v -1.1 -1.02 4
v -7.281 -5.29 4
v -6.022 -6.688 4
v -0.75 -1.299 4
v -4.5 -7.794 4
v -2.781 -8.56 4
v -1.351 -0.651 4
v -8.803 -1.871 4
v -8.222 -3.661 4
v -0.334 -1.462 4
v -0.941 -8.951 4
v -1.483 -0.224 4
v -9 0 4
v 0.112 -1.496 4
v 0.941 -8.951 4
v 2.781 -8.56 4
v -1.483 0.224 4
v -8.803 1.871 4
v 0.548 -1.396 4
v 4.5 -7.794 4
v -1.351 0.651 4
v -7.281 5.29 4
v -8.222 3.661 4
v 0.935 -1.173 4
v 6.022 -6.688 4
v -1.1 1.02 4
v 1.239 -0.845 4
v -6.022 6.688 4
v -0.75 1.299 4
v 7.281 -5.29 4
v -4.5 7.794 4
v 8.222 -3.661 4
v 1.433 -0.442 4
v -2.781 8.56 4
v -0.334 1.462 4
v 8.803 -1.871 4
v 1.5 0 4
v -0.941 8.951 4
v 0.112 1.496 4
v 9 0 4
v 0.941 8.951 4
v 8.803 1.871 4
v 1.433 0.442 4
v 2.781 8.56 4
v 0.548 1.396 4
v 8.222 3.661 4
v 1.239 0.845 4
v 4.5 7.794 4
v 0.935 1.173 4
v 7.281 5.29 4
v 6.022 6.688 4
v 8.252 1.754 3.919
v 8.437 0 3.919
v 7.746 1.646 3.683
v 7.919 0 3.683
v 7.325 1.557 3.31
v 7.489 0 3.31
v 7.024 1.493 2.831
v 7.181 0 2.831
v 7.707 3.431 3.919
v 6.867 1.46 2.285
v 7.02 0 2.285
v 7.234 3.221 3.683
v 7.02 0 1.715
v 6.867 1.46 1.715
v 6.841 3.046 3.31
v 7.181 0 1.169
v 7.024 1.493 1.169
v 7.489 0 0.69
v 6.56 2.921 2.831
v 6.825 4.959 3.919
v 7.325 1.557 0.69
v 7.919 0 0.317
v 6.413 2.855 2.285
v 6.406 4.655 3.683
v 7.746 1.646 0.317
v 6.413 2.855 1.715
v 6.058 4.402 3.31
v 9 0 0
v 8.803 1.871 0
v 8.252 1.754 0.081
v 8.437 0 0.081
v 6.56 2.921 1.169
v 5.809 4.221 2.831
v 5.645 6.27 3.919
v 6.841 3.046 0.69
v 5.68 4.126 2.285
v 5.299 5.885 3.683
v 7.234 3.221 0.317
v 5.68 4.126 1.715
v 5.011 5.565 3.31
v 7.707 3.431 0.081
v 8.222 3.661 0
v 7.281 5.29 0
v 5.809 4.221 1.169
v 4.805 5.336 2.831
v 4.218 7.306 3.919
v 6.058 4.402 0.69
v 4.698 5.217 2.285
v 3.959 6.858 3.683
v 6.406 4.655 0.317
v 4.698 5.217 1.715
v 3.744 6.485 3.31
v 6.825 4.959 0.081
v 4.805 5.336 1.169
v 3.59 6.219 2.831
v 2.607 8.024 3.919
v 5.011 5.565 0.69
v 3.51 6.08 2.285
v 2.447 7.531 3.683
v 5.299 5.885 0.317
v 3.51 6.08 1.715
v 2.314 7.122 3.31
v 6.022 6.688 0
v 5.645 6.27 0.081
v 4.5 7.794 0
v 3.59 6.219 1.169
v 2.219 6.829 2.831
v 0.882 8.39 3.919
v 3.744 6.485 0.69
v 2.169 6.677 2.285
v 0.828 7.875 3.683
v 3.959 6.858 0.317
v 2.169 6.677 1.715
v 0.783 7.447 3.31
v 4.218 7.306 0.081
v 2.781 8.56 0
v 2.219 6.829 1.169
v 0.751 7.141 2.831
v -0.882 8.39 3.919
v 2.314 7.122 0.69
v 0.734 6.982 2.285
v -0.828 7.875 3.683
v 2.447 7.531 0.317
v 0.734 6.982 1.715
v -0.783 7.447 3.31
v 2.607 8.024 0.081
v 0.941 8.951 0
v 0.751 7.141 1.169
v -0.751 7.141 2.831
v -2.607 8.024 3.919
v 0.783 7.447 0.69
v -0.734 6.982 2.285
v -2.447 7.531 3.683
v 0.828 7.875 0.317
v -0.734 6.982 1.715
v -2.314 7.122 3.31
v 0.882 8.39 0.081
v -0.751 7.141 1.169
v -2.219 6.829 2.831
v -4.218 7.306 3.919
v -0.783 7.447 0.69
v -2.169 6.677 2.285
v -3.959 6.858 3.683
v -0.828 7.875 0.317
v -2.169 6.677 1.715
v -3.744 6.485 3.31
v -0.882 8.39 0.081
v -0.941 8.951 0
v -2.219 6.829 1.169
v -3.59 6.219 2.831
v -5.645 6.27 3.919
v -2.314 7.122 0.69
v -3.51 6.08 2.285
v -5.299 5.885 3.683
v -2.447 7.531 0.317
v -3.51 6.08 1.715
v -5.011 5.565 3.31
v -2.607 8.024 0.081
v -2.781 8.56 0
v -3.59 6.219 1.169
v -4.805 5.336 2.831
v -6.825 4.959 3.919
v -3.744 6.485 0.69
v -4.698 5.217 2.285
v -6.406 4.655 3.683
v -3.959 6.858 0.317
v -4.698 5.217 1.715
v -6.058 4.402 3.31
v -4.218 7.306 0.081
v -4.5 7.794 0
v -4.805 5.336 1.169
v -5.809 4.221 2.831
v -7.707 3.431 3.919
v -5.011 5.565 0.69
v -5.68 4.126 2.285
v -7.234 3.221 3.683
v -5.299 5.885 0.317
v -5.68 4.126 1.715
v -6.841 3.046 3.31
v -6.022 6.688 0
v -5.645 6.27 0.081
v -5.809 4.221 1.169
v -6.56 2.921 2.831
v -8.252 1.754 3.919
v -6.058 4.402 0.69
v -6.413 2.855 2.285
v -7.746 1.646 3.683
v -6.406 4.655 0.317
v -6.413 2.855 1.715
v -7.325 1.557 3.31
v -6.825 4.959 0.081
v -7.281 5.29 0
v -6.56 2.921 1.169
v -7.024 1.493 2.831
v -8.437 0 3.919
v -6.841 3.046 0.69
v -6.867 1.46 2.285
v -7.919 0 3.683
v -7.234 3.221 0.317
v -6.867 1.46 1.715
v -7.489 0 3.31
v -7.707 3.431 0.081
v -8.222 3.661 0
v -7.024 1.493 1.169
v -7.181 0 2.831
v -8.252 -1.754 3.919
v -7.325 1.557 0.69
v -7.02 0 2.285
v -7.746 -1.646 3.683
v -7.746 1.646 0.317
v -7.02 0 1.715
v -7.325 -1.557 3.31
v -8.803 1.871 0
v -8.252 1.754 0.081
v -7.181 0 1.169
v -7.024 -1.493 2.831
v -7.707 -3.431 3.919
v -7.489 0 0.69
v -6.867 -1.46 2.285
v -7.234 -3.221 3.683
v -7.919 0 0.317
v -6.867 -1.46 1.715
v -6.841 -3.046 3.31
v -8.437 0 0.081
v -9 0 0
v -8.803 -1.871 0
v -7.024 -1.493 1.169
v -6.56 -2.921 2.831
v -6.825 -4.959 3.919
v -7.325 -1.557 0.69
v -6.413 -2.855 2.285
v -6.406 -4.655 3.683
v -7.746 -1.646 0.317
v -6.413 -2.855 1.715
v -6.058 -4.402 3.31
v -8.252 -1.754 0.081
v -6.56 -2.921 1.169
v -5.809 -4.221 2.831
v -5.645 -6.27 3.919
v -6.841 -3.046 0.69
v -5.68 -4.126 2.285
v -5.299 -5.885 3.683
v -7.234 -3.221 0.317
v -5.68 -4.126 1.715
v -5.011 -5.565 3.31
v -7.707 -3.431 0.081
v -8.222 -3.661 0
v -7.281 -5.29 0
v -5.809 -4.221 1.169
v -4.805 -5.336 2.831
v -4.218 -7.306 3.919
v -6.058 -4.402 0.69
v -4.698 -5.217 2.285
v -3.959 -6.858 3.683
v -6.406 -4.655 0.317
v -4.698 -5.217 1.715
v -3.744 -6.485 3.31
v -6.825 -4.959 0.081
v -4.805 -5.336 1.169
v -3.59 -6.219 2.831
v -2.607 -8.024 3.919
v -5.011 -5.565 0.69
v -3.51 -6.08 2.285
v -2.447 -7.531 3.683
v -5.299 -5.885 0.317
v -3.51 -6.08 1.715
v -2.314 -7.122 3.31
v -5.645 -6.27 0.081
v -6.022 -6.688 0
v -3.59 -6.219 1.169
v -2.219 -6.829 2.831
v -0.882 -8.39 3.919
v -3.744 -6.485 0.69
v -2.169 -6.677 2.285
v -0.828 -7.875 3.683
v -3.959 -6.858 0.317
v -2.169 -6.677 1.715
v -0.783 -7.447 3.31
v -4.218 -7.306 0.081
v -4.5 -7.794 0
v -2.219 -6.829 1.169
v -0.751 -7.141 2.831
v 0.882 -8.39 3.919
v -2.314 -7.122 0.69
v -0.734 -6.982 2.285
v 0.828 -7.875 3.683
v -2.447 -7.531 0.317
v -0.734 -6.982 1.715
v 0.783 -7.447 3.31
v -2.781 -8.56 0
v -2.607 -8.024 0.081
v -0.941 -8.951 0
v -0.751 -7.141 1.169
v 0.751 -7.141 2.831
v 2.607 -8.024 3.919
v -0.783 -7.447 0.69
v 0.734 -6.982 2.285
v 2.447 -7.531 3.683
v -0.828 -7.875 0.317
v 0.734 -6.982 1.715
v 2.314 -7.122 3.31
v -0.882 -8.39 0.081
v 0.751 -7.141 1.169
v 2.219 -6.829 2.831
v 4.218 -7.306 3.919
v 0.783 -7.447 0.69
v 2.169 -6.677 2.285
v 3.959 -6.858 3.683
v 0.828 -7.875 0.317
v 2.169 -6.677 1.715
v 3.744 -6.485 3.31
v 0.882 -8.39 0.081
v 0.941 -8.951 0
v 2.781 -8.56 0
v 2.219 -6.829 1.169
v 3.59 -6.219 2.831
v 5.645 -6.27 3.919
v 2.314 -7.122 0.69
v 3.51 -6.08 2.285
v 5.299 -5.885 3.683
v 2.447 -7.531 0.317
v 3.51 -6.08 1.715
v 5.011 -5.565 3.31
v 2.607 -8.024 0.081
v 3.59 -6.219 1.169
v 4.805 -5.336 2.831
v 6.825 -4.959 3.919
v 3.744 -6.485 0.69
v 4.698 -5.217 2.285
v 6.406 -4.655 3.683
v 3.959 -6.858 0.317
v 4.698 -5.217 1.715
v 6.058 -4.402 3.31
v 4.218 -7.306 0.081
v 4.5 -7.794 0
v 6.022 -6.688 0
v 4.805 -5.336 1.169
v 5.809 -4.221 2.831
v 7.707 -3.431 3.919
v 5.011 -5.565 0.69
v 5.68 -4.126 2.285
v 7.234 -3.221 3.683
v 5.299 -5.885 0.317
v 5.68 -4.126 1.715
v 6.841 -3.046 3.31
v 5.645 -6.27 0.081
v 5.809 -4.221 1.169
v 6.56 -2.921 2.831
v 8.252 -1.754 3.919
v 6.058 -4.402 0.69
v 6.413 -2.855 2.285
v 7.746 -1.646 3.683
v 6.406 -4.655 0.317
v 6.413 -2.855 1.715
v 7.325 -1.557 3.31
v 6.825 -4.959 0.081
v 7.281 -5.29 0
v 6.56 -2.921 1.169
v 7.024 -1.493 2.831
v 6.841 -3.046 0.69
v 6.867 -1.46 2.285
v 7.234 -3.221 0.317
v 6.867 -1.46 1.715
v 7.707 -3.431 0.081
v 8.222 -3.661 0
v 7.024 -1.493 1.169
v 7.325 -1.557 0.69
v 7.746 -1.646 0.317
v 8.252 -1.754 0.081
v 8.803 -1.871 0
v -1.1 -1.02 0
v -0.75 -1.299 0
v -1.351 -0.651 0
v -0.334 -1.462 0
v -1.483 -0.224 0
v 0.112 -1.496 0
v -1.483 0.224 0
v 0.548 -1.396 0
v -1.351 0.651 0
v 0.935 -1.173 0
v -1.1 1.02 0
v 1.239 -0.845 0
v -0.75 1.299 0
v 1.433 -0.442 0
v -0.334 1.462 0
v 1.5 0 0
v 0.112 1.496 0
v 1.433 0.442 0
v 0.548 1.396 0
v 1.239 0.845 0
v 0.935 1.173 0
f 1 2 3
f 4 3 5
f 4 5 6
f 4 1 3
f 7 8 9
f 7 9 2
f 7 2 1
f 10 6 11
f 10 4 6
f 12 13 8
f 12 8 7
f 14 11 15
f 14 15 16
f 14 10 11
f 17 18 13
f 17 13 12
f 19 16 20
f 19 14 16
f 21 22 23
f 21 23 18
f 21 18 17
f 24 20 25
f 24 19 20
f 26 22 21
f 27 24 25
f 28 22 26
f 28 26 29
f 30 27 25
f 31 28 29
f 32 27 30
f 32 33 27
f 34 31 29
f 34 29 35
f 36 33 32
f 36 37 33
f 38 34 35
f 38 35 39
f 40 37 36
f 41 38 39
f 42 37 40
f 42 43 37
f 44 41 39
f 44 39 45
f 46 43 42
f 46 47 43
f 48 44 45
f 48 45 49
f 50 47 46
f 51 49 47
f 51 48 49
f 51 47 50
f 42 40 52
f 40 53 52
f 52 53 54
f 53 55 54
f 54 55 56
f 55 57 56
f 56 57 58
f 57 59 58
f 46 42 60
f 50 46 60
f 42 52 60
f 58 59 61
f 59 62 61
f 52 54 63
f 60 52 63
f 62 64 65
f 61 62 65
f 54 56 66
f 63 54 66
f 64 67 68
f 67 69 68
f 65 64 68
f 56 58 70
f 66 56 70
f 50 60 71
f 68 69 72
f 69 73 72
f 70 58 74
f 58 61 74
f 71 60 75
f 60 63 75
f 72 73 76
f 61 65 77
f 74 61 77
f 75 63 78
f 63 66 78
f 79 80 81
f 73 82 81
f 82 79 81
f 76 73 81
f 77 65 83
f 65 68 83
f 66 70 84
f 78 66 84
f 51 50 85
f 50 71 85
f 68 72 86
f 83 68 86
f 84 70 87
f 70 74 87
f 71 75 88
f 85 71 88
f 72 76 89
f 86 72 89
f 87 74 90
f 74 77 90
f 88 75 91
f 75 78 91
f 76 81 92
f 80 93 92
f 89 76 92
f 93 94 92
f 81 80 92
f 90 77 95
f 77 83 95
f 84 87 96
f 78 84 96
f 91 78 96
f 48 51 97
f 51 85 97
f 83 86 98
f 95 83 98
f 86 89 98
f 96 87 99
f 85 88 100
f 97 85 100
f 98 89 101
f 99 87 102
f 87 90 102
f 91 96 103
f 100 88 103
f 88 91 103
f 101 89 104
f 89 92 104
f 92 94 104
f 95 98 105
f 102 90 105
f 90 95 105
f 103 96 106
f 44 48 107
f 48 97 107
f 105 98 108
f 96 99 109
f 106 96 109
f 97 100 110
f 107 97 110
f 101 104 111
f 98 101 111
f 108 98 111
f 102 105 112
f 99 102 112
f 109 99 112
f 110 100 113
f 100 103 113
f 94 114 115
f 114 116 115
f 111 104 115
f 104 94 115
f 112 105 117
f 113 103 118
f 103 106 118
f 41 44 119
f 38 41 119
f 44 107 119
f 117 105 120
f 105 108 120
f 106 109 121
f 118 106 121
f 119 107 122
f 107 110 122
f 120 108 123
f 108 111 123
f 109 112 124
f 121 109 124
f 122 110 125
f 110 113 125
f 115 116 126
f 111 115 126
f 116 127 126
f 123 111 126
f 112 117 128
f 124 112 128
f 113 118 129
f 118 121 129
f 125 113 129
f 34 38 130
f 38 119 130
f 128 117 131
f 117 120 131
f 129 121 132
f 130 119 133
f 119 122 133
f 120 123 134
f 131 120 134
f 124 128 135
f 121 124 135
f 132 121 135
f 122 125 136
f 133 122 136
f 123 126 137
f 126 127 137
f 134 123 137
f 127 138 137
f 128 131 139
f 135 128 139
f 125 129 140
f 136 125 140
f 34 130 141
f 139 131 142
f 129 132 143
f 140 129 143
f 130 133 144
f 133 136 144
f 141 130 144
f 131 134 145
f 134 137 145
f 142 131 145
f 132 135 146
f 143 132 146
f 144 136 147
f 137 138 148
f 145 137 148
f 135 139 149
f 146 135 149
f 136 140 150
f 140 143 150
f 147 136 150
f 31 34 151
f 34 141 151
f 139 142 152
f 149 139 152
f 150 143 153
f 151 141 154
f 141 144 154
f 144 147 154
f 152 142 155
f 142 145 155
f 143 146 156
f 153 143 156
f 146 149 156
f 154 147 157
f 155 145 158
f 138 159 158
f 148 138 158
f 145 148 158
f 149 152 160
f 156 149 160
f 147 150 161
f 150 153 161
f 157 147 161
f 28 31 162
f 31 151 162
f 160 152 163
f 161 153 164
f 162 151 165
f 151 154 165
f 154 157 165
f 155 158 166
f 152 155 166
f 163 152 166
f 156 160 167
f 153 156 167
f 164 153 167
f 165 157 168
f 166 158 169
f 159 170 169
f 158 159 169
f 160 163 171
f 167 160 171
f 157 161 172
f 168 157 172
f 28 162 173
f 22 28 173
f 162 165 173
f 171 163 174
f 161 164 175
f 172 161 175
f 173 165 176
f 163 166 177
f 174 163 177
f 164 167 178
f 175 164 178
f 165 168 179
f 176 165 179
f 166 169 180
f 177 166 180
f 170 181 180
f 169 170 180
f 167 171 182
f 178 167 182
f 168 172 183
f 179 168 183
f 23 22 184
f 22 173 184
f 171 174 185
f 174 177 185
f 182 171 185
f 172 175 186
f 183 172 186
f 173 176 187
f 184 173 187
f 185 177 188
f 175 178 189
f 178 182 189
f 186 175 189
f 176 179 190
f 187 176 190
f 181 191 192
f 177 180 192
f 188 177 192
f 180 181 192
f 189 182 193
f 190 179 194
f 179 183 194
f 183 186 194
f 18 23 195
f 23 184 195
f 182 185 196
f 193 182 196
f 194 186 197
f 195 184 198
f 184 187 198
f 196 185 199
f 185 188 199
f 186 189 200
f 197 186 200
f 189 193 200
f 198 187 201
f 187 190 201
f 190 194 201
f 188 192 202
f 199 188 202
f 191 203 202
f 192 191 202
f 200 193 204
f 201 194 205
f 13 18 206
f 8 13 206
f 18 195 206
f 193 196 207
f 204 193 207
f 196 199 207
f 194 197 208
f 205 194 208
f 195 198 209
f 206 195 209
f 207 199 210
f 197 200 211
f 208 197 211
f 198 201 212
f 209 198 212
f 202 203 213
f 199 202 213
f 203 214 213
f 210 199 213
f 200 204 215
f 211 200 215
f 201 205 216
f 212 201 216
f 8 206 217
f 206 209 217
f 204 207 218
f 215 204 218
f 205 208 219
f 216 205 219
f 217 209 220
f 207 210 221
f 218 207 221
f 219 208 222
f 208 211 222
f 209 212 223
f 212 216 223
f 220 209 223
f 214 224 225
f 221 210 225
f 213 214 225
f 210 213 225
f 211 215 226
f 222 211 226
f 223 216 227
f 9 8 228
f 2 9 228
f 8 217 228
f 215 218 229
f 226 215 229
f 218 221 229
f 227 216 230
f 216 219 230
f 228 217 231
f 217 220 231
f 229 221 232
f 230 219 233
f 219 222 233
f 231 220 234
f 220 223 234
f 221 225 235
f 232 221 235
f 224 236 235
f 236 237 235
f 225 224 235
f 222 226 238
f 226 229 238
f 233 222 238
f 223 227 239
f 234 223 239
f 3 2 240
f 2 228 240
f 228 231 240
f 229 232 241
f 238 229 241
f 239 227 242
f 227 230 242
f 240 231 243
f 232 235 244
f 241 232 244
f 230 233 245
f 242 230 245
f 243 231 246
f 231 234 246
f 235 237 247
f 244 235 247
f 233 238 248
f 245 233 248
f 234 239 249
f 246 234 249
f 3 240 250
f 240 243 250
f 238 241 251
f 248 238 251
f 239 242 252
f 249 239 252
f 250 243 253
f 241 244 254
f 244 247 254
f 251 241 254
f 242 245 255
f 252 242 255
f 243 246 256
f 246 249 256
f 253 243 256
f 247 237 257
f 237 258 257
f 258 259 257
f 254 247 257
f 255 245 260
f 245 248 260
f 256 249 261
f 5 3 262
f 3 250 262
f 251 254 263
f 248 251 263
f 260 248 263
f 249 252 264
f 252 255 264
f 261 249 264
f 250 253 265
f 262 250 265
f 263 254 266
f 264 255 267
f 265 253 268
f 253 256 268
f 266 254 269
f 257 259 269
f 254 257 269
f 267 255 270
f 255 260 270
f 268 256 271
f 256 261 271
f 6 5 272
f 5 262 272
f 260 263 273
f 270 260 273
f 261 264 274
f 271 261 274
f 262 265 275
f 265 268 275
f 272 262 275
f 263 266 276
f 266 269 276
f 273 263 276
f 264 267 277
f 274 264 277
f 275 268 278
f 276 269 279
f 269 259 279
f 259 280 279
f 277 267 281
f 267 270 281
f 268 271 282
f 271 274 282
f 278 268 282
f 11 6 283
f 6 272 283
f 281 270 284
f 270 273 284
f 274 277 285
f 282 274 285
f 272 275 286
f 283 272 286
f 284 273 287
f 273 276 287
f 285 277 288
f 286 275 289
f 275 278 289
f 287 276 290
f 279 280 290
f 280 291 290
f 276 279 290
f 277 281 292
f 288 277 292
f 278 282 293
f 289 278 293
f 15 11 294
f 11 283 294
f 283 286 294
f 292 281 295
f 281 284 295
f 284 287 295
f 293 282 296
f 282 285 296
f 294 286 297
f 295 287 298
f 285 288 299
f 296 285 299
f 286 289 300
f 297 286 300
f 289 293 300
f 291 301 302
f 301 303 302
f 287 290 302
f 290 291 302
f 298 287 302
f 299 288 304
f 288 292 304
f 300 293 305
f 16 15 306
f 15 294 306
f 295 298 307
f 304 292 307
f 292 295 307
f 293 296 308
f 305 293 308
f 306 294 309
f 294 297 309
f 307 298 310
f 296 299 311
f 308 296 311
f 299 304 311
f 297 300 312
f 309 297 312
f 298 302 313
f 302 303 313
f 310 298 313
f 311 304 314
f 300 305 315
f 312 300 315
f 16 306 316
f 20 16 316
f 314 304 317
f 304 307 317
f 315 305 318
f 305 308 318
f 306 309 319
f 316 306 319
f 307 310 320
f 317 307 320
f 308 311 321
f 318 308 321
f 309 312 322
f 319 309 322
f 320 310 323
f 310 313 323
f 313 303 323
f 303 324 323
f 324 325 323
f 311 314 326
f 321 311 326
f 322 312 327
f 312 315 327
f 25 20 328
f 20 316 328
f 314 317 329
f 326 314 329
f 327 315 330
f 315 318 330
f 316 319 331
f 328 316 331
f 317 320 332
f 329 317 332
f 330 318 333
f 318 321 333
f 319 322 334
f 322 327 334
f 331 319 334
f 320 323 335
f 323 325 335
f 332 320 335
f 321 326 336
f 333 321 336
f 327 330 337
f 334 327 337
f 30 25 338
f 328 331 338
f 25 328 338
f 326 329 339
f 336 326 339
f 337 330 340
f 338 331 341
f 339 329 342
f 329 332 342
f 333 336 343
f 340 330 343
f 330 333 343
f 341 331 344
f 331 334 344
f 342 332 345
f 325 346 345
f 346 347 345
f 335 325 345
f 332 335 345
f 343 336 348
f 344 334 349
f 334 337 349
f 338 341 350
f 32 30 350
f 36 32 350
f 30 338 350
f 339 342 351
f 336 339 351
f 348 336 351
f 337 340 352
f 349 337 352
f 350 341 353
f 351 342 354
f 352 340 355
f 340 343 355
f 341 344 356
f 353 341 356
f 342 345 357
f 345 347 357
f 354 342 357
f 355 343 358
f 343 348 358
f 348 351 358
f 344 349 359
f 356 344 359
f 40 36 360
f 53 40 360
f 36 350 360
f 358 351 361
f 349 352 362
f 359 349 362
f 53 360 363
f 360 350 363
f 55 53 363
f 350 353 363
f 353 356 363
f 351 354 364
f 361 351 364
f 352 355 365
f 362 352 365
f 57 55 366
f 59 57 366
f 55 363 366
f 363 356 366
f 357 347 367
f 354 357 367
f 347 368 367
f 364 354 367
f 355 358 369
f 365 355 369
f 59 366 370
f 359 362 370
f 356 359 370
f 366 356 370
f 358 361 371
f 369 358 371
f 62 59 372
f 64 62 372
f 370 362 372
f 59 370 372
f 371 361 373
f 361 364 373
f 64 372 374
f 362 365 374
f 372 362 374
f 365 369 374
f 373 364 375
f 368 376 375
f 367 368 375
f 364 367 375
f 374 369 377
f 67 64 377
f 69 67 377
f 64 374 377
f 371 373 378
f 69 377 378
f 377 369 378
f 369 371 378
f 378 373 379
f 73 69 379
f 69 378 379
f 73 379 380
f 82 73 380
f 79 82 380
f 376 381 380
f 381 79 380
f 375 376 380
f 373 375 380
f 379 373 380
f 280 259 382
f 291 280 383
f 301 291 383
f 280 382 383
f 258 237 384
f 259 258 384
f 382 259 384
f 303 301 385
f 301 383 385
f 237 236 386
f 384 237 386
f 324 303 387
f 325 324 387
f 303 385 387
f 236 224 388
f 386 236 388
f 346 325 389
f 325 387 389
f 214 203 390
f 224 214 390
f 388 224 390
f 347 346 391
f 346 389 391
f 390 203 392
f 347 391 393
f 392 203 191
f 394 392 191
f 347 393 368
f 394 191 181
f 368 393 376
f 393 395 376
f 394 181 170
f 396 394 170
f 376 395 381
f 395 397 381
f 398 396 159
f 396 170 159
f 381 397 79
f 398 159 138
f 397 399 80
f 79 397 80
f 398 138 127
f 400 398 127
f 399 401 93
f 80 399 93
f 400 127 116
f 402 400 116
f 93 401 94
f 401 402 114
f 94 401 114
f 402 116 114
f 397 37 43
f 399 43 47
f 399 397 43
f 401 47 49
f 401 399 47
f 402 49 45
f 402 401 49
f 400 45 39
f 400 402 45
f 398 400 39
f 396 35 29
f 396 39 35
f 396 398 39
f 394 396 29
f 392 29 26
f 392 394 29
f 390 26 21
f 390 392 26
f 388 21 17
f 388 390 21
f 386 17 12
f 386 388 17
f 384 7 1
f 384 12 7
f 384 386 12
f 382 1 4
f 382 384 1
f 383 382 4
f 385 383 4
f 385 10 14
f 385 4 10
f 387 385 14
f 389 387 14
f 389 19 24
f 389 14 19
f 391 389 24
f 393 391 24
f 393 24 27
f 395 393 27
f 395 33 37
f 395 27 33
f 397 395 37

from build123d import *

# Parameters (mm, degrees)
CYLINDER001_R     = 1.5
CYLINDER001_DEPTH = 5
TORUS_R           = 2
CYLINDER_R        = 9
CYLINDER_DEPTH    = 4


with BuildPart() as cylinder001:
    # Cylinder001 → Cylinder001 (new body)
    with BuildSketch(Plane.XY):
        Circle(CYLINDER001_R)
    extrude(amount=CYLINDER001_DEPTH)


with BuildPart() as torus:
    # Torus → Torus (revolve)
    with BuildSketch(Plane(origin=(0, 0, 2), x_dir=(1, 0, 0), z_dir=(0, -1, 0))):
        with Locations((9, 0)):
            Circle(TORUS_R)
    revolve(axis=Axis((0, 0, 2), (0, 0, 1)))


with BuildPart() as cut001:
    # Cylinder → Cylinder (new body)
    with BuildSketch(Plane.XY):
        Circle(CYLINDER_R)
    extrude(amount=CYLINDER_DEPTH)

    # Cut: cut Torus
    add(torus.part, mode=Mode.SUBTRACT)

    # Cut001: cut Cylinder001
    add(cylinder001.part, mode=Mode.SUBTRACT)


solid = cut001.part
